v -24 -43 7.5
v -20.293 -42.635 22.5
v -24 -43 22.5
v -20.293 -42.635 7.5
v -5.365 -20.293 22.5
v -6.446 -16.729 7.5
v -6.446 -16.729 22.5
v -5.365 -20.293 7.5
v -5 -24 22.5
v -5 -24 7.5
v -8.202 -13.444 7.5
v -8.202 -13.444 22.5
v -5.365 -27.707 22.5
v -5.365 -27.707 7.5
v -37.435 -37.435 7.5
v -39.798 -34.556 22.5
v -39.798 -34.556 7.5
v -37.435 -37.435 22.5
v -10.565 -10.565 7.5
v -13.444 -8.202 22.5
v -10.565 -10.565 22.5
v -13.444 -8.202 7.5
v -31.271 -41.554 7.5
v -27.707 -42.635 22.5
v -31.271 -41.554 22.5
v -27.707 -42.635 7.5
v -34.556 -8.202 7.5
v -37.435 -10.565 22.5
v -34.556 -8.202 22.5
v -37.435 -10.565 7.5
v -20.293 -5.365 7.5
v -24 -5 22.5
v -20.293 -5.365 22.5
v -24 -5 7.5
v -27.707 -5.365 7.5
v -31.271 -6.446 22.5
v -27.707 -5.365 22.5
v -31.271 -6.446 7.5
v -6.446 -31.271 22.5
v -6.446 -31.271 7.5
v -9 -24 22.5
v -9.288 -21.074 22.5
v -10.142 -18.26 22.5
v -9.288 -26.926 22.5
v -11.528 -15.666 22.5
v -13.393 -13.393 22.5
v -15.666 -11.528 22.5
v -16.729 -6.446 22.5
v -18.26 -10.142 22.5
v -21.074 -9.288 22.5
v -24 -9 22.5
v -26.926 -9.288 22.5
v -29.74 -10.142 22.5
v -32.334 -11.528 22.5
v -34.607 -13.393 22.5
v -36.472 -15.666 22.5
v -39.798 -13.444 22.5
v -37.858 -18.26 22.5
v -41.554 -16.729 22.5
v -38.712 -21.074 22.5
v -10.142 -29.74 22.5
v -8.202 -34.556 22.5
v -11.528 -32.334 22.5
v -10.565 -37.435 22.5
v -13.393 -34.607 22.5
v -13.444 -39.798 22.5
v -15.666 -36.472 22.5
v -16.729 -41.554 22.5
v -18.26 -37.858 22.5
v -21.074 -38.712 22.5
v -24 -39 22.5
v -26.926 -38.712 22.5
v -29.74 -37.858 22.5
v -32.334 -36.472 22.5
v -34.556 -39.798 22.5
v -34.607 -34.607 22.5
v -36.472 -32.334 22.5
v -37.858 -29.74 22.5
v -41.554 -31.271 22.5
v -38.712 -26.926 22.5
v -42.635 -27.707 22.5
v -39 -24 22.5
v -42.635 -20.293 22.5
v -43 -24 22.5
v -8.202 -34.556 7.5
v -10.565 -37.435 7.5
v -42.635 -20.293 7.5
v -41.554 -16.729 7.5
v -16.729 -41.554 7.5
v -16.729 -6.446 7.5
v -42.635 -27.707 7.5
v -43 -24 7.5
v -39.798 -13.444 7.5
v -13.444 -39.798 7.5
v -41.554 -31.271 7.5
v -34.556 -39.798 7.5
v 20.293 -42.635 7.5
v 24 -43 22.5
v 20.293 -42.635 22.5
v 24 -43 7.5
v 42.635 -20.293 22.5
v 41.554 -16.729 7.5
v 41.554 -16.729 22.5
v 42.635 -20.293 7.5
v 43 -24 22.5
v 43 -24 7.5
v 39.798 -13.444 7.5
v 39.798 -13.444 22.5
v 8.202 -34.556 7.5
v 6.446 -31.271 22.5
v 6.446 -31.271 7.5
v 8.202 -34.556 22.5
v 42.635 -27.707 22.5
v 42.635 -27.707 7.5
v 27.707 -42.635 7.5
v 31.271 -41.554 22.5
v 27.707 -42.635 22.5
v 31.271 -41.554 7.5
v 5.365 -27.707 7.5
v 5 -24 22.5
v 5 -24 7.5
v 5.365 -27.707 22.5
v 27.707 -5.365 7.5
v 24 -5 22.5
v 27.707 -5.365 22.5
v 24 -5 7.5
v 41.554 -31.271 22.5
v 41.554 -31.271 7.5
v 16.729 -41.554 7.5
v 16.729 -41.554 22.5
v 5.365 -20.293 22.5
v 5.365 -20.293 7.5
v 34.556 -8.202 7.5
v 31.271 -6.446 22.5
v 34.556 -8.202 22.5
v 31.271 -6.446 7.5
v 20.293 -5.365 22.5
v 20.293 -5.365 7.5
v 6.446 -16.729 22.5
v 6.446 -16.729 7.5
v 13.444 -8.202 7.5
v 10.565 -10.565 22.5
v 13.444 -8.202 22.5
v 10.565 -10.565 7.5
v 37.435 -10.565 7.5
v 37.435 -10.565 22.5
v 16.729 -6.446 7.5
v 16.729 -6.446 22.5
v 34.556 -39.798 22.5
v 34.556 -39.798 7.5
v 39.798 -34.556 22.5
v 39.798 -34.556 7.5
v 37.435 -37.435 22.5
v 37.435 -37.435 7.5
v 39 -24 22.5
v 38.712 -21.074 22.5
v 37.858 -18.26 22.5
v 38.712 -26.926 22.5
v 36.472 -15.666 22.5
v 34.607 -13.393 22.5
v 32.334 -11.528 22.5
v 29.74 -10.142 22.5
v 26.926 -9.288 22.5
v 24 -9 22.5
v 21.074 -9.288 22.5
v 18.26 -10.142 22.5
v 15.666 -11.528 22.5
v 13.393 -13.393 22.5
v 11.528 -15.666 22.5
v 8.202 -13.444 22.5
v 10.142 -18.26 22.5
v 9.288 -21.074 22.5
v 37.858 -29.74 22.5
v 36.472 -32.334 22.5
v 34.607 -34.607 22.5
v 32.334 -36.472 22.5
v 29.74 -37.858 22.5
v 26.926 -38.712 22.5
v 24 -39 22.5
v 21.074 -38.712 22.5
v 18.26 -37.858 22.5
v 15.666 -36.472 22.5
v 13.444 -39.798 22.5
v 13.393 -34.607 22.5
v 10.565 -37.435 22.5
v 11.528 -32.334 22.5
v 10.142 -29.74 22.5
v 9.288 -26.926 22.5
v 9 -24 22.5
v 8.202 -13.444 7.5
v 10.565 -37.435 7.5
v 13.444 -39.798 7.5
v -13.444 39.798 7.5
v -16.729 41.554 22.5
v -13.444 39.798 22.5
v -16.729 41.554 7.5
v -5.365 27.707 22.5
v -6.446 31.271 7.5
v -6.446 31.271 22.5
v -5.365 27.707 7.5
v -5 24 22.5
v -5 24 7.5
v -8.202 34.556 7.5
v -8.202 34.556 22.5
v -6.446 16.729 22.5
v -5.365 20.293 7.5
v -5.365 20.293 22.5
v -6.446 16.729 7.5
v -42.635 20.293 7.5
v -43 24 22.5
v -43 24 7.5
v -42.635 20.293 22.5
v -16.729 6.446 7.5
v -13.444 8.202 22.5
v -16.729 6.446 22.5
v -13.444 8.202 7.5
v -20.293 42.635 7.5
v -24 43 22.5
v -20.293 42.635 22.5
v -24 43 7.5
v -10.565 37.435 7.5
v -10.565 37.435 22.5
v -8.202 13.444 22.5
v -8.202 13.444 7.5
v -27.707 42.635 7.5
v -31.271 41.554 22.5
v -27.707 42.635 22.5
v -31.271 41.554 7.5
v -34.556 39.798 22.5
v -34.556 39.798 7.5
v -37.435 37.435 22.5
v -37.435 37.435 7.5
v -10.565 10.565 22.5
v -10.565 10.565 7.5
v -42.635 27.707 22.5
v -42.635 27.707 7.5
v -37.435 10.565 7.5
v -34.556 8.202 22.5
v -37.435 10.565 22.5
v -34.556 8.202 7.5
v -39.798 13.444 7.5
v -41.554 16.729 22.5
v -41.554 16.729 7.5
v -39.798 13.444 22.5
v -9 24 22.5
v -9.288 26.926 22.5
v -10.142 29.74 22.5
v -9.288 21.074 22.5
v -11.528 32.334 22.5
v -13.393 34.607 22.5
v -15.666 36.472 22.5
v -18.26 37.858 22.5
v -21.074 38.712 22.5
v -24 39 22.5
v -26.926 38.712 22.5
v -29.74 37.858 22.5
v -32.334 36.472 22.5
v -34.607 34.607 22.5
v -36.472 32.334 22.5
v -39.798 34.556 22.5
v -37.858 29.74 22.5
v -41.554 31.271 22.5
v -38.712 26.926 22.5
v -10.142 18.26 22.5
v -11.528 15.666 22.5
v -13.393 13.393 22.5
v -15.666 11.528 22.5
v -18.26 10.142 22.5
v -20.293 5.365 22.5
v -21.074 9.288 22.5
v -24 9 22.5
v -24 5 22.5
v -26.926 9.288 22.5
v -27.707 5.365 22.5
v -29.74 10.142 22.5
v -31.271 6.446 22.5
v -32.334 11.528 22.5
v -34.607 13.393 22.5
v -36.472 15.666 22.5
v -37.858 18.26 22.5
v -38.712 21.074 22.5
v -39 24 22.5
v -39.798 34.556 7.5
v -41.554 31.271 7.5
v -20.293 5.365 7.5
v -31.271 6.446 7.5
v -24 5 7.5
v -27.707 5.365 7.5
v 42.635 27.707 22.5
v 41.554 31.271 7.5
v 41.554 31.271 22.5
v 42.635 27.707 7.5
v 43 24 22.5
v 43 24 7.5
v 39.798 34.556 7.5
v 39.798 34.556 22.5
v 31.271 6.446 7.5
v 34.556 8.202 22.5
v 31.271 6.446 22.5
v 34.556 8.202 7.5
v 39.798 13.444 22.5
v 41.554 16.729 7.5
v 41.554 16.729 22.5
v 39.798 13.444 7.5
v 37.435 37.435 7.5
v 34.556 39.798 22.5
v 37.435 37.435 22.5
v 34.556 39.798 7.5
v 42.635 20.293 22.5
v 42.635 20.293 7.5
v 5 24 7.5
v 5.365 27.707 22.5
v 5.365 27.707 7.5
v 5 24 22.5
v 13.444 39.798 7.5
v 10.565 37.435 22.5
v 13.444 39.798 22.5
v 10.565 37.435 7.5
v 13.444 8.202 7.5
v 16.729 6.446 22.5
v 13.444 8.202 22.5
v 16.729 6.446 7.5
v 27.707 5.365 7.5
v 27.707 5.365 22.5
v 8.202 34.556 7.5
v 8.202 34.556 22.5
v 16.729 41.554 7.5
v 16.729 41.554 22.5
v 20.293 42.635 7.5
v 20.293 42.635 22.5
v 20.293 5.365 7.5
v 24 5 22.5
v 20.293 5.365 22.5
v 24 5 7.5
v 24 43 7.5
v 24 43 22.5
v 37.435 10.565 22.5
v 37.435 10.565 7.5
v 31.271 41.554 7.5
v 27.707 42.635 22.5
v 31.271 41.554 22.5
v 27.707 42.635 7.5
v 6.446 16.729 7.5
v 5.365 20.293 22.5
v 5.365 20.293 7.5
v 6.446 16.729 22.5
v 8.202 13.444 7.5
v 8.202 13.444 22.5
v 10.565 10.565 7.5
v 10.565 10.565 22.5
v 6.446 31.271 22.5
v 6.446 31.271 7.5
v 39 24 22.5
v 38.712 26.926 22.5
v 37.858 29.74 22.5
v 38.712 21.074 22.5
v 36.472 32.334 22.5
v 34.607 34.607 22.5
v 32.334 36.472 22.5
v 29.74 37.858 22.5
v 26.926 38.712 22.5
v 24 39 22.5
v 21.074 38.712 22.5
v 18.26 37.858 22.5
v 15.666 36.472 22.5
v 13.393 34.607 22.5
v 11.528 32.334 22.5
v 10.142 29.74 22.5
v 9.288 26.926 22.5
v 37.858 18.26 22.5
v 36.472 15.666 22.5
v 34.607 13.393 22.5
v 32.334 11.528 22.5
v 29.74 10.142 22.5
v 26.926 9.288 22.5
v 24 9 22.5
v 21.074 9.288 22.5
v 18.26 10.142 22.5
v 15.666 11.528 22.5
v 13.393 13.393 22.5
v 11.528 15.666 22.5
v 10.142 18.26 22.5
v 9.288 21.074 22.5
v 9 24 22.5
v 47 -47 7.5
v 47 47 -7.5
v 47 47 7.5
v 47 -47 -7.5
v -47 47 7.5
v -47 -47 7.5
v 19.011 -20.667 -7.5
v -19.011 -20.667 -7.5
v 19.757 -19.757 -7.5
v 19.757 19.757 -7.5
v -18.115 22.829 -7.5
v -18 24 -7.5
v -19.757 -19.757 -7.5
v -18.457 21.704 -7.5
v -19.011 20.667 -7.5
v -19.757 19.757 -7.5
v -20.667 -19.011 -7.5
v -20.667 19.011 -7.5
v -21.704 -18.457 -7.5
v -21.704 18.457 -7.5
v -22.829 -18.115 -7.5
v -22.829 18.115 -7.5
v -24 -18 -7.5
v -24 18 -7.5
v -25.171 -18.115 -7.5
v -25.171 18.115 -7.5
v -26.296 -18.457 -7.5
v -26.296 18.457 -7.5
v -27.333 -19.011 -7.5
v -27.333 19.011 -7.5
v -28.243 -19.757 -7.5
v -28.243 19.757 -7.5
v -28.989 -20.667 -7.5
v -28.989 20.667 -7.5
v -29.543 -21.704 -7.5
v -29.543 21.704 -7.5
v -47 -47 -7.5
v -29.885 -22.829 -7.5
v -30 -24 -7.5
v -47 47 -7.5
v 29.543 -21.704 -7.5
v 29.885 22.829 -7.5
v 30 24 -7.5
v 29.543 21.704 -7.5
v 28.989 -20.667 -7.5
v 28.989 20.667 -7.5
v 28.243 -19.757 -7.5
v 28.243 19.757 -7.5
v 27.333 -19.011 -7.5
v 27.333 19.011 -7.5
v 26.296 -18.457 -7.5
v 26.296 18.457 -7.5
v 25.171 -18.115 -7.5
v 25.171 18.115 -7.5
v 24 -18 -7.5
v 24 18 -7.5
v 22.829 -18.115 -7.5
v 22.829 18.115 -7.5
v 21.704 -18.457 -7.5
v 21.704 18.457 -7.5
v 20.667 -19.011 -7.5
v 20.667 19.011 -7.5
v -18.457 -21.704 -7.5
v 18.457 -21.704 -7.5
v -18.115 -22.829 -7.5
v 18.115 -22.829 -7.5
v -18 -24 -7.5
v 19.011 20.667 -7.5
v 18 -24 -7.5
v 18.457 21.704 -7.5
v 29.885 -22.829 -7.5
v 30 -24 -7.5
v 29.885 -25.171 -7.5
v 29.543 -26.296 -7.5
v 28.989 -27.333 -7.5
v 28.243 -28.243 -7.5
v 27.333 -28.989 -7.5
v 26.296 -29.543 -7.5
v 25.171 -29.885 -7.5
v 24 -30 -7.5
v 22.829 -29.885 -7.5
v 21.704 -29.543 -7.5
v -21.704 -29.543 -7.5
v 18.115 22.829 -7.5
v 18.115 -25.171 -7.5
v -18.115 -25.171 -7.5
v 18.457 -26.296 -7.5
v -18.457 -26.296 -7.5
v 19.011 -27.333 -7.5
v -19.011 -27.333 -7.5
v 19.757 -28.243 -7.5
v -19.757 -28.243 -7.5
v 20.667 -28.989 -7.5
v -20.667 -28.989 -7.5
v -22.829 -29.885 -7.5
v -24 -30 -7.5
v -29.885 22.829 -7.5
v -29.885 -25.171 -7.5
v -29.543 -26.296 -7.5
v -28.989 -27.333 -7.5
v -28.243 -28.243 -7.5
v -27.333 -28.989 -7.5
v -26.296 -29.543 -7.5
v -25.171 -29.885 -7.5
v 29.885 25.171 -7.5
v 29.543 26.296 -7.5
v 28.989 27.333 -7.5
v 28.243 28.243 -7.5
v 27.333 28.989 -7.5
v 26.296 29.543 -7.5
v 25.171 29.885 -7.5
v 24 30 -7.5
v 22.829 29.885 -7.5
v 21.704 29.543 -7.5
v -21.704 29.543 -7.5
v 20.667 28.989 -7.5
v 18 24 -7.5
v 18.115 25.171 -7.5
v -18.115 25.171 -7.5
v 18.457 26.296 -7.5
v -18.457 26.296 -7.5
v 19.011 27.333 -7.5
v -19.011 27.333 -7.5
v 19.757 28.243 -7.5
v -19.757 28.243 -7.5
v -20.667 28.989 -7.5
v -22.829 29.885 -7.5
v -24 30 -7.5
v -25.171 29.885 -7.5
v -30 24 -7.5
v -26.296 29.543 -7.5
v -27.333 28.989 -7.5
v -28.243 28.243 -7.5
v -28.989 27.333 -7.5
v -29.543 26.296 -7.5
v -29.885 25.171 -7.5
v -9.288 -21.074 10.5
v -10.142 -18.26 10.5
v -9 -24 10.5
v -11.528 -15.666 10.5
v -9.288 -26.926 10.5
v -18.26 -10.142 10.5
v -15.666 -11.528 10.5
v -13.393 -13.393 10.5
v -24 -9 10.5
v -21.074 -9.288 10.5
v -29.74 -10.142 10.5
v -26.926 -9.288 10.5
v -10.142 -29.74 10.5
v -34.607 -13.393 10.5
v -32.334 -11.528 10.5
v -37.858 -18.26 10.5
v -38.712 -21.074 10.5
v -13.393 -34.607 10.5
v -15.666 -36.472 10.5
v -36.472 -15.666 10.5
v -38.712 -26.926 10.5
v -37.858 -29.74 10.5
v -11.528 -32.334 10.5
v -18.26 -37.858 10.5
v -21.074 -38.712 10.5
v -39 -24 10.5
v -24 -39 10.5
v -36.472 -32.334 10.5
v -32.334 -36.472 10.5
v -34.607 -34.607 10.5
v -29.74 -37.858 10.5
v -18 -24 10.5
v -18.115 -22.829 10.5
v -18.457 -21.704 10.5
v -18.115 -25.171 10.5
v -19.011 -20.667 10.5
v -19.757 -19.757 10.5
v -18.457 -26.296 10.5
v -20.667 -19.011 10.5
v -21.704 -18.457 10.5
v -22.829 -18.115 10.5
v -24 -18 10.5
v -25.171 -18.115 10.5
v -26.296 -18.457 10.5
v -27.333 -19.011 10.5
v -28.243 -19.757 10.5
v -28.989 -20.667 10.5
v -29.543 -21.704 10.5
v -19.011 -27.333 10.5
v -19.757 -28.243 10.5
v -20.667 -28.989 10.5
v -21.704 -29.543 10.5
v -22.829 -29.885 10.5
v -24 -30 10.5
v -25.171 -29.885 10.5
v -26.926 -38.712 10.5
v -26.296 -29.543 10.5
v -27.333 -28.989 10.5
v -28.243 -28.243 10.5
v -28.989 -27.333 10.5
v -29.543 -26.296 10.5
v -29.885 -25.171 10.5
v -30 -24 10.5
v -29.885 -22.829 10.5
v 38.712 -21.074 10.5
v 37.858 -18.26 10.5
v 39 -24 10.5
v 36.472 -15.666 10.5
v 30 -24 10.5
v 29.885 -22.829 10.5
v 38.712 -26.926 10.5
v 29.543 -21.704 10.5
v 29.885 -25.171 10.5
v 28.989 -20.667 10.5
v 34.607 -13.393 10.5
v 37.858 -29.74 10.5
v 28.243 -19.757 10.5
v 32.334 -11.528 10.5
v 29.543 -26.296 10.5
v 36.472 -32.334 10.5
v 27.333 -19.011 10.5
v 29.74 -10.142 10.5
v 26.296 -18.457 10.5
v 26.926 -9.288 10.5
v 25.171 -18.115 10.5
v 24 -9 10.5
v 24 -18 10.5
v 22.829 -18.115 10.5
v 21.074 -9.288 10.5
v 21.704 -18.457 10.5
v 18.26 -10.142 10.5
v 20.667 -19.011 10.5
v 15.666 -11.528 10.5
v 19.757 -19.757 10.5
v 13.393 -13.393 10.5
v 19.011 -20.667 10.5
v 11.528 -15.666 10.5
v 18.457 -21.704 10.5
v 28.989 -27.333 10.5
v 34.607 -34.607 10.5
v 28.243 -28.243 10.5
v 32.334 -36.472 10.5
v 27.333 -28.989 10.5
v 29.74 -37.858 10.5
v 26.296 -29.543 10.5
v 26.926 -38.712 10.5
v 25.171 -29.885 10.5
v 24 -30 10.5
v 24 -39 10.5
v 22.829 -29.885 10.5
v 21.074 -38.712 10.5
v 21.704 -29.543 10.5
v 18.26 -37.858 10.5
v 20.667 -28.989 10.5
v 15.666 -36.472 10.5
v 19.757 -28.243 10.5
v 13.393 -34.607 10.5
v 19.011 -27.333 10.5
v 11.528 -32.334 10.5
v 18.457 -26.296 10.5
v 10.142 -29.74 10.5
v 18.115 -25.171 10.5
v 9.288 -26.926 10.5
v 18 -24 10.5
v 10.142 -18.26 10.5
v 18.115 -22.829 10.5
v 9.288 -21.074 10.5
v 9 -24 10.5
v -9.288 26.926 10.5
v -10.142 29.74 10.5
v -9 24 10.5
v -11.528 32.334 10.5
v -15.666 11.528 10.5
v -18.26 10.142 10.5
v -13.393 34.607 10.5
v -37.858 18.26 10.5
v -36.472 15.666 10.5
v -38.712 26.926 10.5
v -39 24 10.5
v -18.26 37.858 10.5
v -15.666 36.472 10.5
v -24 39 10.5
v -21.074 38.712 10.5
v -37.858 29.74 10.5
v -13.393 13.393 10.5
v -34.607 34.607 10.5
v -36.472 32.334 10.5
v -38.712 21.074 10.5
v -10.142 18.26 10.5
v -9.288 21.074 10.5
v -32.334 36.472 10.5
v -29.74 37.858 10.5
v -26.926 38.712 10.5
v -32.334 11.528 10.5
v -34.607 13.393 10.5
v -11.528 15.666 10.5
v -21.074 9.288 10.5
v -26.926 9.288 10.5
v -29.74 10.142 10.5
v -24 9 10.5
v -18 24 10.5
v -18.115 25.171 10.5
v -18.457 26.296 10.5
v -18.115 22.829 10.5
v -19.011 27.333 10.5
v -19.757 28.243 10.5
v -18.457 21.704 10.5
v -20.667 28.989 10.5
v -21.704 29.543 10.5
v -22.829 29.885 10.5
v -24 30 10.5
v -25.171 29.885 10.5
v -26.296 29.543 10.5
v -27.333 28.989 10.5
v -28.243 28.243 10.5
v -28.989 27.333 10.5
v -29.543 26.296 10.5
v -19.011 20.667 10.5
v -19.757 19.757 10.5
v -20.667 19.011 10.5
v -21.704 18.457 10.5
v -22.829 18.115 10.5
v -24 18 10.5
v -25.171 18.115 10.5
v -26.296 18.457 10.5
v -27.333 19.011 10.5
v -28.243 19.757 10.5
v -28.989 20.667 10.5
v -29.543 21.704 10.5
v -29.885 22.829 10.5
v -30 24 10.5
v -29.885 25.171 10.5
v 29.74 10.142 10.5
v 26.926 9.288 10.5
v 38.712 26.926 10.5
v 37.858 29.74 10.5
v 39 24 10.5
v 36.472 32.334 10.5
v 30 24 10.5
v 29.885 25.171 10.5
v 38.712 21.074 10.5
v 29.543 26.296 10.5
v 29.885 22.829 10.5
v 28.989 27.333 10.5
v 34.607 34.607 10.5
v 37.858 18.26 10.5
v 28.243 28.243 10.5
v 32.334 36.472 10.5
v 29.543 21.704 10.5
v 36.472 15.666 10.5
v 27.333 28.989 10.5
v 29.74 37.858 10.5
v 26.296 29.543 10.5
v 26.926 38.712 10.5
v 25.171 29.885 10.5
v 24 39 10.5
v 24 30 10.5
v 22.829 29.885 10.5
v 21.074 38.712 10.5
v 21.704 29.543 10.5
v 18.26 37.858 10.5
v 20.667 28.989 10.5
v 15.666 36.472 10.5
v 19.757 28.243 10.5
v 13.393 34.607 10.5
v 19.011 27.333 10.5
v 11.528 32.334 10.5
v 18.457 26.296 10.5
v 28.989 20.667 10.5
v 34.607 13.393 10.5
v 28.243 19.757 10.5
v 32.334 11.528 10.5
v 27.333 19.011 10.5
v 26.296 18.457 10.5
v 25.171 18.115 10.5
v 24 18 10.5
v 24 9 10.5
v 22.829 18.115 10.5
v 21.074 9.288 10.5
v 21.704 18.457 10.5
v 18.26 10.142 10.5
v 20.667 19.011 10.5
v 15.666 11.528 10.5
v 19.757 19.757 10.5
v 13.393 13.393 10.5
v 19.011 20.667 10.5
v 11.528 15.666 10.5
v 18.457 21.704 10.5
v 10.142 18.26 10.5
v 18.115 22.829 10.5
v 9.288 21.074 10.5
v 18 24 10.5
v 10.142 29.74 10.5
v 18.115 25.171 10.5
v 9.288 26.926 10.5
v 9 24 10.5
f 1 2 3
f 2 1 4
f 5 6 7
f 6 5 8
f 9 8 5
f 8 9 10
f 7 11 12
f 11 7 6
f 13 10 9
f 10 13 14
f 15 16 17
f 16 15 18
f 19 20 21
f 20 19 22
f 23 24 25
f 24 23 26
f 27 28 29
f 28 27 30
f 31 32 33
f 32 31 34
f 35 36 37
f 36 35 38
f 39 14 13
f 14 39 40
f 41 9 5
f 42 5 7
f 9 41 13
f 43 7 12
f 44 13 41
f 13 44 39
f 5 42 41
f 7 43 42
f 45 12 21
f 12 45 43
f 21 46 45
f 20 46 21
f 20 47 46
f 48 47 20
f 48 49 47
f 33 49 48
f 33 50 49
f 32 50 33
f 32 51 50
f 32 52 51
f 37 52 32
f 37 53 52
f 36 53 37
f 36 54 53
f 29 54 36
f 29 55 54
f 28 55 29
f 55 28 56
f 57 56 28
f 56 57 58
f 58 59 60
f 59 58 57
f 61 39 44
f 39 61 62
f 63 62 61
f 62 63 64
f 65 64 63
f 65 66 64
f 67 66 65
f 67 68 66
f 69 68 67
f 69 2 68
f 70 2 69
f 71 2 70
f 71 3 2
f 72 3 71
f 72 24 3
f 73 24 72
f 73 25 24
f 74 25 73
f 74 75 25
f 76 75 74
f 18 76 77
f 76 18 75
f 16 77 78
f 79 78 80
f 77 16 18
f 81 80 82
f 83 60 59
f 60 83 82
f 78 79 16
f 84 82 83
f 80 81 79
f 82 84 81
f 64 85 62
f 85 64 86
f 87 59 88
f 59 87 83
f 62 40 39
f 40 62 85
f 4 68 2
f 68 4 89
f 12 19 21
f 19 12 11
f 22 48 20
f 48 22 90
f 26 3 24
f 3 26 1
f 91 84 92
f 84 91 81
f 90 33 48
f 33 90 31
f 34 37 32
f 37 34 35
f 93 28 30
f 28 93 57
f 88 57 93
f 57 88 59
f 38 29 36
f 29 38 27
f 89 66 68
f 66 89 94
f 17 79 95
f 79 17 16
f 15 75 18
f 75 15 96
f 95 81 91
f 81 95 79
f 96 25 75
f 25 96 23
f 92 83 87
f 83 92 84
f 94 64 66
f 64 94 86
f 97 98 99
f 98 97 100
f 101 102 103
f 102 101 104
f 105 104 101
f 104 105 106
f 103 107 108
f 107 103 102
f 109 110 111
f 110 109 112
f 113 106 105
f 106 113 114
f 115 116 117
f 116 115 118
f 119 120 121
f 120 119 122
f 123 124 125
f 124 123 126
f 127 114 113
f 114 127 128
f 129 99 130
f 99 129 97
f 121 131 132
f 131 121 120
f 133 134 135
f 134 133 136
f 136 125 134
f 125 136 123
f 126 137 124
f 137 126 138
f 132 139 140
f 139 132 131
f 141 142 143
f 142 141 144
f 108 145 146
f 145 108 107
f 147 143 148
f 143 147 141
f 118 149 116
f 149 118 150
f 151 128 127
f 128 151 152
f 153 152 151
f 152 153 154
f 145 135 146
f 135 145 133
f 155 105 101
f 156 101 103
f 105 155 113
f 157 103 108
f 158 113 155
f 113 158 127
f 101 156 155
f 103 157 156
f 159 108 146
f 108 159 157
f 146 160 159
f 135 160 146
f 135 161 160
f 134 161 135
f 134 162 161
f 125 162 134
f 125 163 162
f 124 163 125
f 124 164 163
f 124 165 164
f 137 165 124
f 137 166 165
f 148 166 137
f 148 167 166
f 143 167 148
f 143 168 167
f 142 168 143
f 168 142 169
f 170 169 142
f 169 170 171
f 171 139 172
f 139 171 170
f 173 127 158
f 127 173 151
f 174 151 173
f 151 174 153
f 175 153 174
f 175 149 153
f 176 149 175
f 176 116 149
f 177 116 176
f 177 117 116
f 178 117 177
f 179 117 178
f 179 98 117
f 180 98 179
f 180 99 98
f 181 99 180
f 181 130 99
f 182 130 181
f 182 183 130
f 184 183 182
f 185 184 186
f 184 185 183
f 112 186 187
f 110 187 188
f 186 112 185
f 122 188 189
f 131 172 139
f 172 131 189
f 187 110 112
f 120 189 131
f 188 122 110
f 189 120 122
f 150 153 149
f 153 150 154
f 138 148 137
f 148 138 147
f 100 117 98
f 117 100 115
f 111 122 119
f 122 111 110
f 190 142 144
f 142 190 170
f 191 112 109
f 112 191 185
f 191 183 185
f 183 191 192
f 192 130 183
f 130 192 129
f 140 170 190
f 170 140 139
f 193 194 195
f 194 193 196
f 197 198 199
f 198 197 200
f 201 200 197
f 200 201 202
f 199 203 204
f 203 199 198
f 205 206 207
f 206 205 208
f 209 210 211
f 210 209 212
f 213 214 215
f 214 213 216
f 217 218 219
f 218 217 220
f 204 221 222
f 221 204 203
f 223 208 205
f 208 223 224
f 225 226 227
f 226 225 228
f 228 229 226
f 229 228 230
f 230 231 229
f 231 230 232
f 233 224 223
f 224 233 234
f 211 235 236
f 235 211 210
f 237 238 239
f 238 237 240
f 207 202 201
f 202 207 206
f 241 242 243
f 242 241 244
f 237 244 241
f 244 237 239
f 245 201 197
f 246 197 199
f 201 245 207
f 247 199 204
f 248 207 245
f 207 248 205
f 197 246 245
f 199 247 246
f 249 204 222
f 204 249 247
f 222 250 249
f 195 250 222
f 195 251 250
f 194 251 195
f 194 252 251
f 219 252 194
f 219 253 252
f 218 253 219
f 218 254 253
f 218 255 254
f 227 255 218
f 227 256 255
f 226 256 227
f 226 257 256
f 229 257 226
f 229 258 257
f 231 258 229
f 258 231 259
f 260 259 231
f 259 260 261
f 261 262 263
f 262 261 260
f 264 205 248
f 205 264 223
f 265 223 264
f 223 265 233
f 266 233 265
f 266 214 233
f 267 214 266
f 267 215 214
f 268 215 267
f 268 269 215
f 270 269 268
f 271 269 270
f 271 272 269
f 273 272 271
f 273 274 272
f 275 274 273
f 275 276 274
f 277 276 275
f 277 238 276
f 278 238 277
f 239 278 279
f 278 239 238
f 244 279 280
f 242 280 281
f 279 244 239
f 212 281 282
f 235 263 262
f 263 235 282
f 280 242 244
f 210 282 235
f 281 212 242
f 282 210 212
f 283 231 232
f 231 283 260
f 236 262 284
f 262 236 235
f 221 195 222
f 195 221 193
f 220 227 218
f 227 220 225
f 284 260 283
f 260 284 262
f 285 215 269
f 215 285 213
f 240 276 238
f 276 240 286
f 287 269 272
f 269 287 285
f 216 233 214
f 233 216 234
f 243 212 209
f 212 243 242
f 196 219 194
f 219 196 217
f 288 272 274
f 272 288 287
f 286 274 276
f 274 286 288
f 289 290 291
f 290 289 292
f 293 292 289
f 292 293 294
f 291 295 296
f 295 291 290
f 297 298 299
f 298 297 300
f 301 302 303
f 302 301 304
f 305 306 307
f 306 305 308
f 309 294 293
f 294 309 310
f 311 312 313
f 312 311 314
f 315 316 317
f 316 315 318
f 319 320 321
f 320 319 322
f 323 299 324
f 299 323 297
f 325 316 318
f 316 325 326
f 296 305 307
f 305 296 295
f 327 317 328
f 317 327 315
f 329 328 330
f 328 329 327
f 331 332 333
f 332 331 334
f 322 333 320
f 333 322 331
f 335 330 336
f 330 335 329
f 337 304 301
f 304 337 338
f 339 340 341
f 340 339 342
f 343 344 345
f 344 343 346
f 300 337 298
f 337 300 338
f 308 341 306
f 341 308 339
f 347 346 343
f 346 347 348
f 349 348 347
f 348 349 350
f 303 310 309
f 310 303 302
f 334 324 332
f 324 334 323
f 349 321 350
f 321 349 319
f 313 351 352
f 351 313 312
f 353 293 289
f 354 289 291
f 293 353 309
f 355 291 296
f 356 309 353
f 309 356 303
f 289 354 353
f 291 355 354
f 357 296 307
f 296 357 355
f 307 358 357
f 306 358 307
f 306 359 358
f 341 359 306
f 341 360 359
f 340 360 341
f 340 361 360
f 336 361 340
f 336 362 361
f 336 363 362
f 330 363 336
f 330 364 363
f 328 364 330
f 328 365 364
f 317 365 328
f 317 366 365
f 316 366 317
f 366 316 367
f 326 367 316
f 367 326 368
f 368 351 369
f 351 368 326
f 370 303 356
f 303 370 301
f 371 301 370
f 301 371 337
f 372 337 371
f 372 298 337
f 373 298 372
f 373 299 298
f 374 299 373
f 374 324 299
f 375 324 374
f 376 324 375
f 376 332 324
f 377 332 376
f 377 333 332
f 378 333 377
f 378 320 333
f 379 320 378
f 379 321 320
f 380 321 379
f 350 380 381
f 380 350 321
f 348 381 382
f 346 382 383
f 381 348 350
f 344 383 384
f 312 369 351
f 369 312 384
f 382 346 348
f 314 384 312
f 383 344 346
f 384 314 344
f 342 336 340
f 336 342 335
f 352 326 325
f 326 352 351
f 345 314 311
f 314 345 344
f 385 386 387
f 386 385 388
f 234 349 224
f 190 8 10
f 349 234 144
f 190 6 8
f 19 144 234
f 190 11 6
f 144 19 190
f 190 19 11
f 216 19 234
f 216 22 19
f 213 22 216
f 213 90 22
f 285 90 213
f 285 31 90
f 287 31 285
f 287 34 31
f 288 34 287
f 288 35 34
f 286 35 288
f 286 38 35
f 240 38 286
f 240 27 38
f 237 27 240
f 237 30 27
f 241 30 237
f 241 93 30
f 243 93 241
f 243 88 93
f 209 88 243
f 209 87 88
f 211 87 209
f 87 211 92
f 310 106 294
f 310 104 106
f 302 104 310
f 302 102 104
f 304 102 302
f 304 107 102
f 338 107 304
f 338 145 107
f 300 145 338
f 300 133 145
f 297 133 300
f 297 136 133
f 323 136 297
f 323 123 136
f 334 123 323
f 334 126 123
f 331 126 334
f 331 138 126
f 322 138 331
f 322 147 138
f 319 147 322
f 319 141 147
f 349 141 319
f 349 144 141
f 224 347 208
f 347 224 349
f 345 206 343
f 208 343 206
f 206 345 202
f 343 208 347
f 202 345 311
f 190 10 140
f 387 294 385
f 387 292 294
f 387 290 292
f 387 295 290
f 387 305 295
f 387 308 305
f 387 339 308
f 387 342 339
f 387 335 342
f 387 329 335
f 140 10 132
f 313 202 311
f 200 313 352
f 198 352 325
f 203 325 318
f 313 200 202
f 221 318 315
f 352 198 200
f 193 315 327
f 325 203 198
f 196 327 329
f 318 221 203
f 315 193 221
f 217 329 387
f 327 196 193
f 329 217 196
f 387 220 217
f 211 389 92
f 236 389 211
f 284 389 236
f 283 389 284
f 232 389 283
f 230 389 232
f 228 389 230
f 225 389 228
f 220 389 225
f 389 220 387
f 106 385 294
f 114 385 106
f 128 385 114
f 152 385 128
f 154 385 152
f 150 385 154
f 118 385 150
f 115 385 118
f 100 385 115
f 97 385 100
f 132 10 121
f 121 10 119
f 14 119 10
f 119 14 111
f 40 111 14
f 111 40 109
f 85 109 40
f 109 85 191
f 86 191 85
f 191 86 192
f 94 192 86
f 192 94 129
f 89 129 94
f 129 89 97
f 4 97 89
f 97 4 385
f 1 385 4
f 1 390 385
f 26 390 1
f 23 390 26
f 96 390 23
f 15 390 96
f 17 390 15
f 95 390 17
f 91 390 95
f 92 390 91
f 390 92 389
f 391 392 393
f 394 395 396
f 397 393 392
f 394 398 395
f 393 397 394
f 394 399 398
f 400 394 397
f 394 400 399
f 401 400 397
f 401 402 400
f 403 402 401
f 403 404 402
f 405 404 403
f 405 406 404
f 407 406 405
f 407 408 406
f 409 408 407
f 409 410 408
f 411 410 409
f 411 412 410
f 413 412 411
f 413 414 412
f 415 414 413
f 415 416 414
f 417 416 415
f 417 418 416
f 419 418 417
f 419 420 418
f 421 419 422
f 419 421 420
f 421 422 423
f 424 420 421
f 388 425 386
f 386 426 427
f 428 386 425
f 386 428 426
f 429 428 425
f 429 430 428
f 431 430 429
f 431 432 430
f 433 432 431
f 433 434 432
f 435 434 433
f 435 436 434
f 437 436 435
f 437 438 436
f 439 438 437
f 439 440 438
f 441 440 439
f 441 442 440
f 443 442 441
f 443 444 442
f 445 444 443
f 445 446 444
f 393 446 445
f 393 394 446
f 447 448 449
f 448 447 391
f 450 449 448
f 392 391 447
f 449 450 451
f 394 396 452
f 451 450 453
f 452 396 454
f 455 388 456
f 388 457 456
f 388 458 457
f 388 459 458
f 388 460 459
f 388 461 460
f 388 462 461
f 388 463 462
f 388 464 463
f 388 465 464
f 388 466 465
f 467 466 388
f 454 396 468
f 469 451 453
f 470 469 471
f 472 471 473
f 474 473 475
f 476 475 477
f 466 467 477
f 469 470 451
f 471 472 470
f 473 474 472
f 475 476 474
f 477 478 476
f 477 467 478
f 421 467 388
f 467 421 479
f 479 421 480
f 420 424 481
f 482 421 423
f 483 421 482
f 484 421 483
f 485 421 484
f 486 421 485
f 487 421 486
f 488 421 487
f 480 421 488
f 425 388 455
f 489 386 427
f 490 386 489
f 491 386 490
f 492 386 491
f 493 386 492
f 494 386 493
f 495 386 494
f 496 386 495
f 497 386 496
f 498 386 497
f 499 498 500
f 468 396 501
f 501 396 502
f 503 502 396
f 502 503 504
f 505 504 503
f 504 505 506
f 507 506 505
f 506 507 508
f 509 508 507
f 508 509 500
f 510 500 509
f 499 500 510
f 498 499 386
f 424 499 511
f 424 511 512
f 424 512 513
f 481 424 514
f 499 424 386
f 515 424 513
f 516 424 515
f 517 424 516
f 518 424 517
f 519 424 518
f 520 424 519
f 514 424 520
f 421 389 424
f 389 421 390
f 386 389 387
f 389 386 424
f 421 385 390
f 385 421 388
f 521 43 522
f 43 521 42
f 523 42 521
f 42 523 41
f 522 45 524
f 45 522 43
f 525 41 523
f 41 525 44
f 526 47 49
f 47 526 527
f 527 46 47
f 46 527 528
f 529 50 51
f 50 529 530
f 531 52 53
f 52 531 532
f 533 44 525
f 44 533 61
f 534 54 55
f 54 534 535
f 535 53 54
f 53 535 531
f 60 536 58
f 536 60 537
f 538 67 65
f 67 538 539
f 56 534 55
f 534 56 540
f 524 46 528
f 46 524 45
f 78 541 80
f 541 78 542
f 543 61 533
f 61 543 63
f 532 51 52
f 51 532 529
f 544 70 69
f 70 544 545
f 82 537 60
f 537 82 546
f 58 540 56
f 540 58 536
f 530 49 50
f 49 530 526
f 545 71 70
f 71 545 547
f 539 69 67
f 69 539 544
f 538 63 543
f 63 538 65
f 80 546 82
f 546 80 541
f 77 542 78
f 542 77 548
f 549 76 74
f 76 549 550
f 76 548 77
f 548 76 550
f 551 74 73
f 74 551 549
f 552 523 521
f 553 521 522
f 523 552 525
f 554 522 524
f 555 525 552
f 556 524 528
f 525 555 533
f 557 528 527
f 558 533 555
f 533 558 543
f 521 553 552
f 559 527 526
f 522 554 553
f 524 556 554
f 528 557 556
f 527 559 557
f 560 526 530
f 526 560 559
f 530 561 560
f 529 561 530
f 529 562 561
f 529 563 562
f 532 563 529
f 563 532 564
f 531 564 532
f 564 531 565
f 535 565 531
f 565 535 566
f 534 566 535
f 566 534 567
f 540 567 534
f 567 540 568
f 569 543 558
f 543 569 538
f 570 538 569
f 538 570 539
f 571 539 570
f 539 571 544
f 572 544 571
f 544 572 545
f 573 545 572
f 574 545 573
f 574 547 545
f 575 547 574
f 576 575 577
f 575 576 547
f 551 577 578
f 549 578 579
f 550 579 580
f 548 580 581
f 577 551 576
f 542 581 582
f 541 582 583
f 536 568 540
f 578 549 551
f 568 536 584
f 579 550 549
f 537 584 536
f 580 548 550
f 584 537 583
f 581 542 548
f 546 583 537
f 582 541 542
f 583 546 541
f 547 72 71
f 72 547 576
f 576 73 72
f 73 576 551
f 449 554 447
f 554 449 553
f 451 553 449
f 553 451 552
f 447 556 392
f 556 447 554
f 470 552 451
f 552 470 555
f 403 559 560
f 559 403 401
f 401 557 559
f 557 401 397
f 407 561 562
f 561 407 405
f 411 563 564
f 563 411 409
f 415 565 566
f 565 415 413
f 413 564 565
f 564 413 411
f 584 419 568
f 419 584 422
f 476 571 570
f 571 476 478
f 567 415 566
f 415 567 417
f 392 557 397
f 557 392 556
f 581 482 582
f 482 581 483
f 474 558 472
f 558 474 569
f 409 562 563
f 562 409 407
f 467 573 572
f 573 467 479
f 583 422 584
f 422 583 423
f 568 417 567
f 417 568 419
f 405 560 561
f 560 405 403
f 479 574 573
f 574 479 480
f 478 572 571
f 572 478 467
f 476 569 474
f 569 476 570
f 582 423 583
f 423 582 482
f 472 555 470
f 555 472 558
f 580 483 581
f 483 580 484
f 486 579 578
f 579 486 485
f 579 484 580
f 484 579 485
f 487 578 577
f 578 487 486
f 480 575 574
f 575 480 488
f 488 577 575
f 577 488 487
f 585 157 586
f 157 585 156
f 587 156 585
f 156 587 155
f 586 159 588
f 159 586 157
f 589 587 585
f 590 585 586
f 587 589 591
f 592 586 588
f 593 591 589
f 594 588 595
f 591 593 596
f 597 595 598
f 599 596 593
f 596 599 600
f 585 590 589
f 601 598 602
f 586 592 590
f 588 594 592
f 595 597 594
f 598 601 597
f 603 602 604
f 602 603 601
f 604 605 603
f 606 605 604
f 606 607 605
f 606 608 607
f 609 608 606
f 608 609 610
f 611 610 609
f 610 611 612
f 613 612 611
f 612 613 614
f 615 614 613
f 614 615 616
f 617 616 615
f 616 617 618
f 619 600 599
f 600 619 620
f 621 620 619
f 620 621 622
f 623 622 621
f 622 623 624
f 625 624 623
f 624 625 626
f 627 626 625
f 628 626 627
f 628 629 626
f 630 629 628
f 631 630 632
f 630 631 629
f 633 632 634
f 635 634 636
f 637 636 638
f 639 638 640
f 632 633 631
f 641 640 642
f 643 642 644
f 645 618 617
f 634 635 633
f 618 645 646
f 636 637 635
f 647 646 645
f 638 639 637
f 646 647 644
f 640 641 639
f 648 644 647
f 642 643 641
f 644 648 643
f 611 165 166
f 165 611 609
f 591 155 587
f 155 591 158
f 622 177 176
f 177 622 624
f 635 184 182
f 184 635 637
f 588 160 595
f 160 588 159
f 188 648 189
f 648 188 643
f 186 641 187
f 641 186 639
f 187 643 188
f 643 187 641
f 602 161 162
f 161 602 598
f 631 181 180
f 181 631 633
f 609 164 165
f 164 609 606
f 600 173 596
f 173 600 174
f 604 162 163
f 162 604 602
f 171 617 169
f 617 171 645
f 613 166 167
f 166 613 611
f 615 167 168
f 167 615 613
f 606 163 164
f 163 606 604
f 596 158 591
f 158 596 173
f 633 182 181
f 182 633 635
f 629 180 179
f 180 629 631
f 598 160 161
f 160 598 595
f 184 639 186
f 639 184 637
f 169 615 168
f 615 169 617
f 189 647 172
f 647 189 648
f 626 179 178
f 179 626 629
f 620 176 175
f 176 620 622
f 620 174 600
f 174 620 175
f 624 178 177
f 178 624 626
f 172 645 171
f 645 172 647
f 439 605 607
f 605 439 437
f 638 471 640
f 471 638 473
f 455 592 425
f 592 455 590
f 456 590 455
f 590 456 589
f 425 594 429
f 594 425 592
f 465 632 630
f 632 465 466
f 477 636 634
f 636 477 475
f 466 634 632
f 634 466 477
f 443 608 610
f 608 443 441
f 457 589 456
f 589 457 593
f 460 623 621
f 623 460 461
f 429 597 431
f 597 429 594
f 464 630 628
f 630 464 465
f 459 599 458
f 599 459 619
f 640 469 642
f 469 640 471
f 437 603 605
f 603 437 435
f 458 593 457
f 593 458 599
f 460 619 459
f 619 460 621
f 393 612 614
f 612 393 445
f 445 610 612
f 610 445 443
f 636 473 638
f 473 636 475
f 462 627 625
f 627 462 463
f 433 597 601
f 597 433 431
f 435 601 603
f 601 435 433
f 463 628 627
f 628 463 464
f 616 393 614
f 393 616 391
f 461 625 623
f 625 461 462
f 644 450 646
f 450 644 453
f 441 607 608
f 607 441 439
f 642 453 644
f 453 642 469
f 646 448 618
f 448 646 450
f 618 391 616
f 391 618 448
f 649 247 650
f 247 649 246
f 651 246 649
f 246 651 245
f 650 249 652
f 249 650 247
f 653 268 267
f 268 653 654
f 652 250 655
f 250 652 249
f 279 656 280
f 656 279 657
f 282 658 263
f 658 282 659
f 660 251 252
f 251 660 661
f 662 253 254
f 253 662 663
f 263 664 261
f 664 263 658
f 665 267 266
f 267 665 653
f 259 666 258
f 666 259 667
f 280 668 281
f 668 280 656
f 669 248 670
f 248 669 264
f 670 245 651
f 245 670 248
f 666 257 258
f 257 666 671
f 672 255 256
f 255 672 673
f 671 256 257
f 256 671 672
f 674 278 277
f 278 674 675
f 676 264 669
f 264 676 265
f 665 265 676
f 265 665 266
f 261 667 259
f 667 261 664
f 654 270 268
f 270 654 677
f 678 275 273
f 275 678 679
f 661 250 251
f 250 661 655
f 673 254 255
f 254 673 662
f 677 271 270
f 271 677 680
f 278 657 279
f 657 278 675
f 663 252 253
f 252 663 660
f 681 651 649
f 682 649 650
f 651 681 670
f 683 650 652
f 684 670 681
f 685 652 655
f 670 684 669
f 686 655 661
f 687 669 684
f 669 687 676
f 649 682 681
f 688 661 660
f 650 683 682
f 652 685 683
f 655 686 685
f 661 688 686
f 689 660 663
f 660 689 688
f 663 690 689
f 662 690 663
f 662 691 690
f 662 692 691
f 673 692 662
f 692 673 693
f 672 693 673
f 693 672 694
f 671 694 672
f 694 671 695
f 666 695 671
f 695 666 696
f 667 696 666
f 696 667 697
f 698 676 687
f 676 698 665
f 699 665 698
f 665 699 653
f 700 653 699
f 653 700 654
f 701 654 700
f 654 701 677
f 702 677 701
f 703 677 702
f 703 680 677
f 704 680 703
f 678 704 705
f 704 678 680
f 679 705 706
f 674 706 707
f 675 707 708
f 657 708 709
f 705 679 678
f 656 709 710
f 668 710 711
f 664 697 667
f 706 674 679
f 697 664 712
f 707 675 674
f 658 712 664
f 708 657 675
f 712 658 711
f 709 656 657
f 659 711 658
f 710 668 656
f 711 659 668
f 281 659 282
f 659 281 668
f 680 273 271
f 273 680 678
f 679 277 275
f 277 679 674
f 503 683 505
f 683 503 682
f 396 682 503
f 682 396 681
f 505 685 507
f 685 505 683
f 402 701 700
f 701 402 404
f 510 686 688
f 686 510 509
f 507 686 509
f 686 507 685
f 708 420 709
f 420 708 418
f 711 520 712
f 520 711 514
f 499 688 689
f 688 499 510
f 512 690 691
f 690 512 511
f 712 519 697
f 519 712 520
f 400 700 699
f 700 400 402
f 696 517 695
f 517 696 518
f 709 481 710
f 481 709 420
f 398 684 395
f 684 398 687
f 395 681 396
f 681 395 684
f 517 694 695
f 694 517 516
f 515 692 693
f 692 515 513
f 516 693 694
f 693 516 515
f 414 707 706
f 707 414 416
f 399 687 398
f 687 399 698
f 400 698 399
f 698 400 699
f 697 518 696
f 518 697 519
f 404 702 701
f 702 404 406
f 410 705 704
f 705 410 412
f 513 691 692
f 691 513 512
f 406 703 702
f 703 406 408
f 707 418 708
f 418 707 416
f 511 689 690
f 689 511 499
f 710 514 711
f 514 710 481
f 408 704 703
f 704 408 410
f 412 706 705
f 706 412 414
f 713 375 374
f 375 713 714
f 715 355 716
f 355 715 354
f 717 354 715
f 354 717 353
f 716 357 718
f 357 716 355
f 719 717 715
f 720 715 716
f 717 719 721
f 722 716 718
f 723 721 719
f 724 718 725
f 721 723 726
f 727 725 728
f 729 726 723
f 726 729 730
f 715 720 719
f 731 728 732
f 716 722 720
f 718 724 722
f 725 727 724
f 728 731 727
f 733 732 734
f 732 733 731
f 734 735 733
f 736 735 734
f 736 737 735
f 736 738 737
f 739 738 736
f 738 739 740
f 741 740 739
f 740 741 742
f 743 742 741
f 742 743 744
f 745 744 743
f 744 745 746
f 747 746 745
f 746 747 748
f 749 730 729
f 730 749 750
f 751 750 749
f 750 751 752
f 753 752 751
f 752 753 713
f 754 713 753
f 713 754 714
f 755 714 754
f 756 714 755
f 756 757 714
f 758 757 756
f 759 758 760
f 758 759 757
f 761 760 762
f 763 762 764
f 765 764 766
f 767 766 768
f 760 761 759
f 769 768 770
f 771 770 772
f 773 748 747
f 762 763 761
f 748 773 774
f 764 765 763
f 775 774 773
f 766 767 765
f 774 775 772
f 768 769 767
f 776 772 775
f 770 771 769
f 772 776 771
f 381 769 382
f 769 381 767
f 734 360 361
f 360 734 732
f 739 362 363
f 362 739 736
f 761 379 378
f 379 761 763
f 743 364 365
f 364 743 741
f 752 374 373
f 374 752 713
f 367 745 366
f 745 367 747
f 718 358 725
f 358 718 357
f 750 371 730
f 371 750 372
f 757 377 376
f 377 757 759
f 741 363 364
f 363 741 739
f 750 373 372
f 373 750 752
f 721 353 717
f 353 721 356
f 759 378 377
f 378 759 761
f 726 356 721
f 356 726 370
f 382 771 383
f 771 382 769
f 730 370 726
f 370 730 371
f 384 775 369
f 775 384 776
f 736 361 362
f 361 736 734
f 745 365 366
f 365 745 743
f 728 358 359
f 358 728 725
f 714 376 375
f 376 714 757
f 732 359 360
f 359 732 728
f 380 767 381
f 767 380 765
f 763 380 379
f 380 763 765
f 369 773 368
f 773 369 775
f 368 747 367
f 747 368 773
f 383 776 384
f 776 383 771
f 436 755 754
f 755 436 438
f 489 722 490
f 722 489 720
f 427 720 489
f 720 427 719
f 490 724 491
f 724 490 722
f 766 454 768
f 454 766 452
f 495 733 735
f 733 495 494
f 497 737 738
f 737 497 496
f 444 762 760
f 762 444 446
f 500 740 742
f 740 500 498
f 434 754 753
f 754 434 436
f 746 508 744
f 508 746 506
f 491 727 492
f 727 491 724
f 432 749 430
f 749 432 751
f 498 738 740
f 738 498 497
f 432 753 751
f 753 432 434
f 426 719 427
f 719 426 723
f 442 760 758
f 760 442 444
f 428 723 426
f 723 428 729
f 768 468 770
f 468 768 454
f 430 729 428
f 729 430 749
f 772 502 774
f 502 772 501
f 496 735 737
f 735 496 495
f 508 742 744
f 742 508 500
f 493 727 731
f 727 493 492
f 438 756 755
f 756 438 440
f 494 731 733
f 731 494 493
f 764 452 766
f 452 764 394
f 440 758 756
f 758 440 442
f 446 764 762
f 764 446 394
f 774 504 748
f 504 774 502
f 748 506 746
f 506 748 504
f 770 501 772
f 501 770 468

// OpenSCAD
$fn = 32;

// ----------------------------------------------------------------------
// Socket pad plate
// bosses with counterbored sockets for the screws
// ----------------------------------------------------------------------

// --- parameters (mm) ---
base_t = 15;        // base plate thickness
boss_h = 15;        // boss height above the base plate
boss_d = 38;        // boss diameter
socket_d = 30;      // socket diameter
socket_depth = 12;  // socket depth from the boss face
bolt_d = 12;        // screw clearance hole through the socket floor
rows = 2;           // boss rows
cols = 2;           // bosses per row
pitch = 48;         // boss pitch

// --- derived feature positions (mm) ---
height = base_t + boss_h;           // = 30   overall height of the part
plate = [pitch * (cols - 1) + boss_d + 8, pitch * (rows - 1) + boss_d + 8, base_t];  // = [94, 94, 15]   overall size (x, y, z)
span_x = pitch * (cols - 1);        // = 48   distance between outer bosses
span_y = pitch * (rows - 1);        // = 48   distance between boss rows
origin_x = -span_x / 2;             // = -24   X of the first boss
origin_y = -span_y / 2;             // = -24   Y of the first boss
feature_centers = [
  [origin_x + 0 * pitch, origin_y + 0 * pitch],
  [origin_x + 1 * pitch, origin_y + 0 * pitch],
  [origin_x + 0 * pitch, origin_y + 1 * pitch],
  [origin_x + 1 * pitch, origin_y + 1 * pitch]
];   // boss centres: sockets, holes and the pads themselves are placed from here

// base plate, bosses on feature_centers, socket + through hole in each
difference() {
  union() {
    cube(plate, center = true);
    for (centre = feature_centers)
      translate([centre[0], centre[1], plate[2] / 2 - 1])
        cylinder(d = boss_d, h = boss_h + 1);
  }
  for (centre = feature_centers) {
    translate([centre[0], centre[1], plate[2] / 2 + boss_h - socket_depth])
      cylinder(d = socket_d, h = socket_depth + 1);
    translate([centre[0], centre[1], -height])
      cylinder(d = bolt_d, h = 2 * height + 2);  // through the socket floor
  }
}
